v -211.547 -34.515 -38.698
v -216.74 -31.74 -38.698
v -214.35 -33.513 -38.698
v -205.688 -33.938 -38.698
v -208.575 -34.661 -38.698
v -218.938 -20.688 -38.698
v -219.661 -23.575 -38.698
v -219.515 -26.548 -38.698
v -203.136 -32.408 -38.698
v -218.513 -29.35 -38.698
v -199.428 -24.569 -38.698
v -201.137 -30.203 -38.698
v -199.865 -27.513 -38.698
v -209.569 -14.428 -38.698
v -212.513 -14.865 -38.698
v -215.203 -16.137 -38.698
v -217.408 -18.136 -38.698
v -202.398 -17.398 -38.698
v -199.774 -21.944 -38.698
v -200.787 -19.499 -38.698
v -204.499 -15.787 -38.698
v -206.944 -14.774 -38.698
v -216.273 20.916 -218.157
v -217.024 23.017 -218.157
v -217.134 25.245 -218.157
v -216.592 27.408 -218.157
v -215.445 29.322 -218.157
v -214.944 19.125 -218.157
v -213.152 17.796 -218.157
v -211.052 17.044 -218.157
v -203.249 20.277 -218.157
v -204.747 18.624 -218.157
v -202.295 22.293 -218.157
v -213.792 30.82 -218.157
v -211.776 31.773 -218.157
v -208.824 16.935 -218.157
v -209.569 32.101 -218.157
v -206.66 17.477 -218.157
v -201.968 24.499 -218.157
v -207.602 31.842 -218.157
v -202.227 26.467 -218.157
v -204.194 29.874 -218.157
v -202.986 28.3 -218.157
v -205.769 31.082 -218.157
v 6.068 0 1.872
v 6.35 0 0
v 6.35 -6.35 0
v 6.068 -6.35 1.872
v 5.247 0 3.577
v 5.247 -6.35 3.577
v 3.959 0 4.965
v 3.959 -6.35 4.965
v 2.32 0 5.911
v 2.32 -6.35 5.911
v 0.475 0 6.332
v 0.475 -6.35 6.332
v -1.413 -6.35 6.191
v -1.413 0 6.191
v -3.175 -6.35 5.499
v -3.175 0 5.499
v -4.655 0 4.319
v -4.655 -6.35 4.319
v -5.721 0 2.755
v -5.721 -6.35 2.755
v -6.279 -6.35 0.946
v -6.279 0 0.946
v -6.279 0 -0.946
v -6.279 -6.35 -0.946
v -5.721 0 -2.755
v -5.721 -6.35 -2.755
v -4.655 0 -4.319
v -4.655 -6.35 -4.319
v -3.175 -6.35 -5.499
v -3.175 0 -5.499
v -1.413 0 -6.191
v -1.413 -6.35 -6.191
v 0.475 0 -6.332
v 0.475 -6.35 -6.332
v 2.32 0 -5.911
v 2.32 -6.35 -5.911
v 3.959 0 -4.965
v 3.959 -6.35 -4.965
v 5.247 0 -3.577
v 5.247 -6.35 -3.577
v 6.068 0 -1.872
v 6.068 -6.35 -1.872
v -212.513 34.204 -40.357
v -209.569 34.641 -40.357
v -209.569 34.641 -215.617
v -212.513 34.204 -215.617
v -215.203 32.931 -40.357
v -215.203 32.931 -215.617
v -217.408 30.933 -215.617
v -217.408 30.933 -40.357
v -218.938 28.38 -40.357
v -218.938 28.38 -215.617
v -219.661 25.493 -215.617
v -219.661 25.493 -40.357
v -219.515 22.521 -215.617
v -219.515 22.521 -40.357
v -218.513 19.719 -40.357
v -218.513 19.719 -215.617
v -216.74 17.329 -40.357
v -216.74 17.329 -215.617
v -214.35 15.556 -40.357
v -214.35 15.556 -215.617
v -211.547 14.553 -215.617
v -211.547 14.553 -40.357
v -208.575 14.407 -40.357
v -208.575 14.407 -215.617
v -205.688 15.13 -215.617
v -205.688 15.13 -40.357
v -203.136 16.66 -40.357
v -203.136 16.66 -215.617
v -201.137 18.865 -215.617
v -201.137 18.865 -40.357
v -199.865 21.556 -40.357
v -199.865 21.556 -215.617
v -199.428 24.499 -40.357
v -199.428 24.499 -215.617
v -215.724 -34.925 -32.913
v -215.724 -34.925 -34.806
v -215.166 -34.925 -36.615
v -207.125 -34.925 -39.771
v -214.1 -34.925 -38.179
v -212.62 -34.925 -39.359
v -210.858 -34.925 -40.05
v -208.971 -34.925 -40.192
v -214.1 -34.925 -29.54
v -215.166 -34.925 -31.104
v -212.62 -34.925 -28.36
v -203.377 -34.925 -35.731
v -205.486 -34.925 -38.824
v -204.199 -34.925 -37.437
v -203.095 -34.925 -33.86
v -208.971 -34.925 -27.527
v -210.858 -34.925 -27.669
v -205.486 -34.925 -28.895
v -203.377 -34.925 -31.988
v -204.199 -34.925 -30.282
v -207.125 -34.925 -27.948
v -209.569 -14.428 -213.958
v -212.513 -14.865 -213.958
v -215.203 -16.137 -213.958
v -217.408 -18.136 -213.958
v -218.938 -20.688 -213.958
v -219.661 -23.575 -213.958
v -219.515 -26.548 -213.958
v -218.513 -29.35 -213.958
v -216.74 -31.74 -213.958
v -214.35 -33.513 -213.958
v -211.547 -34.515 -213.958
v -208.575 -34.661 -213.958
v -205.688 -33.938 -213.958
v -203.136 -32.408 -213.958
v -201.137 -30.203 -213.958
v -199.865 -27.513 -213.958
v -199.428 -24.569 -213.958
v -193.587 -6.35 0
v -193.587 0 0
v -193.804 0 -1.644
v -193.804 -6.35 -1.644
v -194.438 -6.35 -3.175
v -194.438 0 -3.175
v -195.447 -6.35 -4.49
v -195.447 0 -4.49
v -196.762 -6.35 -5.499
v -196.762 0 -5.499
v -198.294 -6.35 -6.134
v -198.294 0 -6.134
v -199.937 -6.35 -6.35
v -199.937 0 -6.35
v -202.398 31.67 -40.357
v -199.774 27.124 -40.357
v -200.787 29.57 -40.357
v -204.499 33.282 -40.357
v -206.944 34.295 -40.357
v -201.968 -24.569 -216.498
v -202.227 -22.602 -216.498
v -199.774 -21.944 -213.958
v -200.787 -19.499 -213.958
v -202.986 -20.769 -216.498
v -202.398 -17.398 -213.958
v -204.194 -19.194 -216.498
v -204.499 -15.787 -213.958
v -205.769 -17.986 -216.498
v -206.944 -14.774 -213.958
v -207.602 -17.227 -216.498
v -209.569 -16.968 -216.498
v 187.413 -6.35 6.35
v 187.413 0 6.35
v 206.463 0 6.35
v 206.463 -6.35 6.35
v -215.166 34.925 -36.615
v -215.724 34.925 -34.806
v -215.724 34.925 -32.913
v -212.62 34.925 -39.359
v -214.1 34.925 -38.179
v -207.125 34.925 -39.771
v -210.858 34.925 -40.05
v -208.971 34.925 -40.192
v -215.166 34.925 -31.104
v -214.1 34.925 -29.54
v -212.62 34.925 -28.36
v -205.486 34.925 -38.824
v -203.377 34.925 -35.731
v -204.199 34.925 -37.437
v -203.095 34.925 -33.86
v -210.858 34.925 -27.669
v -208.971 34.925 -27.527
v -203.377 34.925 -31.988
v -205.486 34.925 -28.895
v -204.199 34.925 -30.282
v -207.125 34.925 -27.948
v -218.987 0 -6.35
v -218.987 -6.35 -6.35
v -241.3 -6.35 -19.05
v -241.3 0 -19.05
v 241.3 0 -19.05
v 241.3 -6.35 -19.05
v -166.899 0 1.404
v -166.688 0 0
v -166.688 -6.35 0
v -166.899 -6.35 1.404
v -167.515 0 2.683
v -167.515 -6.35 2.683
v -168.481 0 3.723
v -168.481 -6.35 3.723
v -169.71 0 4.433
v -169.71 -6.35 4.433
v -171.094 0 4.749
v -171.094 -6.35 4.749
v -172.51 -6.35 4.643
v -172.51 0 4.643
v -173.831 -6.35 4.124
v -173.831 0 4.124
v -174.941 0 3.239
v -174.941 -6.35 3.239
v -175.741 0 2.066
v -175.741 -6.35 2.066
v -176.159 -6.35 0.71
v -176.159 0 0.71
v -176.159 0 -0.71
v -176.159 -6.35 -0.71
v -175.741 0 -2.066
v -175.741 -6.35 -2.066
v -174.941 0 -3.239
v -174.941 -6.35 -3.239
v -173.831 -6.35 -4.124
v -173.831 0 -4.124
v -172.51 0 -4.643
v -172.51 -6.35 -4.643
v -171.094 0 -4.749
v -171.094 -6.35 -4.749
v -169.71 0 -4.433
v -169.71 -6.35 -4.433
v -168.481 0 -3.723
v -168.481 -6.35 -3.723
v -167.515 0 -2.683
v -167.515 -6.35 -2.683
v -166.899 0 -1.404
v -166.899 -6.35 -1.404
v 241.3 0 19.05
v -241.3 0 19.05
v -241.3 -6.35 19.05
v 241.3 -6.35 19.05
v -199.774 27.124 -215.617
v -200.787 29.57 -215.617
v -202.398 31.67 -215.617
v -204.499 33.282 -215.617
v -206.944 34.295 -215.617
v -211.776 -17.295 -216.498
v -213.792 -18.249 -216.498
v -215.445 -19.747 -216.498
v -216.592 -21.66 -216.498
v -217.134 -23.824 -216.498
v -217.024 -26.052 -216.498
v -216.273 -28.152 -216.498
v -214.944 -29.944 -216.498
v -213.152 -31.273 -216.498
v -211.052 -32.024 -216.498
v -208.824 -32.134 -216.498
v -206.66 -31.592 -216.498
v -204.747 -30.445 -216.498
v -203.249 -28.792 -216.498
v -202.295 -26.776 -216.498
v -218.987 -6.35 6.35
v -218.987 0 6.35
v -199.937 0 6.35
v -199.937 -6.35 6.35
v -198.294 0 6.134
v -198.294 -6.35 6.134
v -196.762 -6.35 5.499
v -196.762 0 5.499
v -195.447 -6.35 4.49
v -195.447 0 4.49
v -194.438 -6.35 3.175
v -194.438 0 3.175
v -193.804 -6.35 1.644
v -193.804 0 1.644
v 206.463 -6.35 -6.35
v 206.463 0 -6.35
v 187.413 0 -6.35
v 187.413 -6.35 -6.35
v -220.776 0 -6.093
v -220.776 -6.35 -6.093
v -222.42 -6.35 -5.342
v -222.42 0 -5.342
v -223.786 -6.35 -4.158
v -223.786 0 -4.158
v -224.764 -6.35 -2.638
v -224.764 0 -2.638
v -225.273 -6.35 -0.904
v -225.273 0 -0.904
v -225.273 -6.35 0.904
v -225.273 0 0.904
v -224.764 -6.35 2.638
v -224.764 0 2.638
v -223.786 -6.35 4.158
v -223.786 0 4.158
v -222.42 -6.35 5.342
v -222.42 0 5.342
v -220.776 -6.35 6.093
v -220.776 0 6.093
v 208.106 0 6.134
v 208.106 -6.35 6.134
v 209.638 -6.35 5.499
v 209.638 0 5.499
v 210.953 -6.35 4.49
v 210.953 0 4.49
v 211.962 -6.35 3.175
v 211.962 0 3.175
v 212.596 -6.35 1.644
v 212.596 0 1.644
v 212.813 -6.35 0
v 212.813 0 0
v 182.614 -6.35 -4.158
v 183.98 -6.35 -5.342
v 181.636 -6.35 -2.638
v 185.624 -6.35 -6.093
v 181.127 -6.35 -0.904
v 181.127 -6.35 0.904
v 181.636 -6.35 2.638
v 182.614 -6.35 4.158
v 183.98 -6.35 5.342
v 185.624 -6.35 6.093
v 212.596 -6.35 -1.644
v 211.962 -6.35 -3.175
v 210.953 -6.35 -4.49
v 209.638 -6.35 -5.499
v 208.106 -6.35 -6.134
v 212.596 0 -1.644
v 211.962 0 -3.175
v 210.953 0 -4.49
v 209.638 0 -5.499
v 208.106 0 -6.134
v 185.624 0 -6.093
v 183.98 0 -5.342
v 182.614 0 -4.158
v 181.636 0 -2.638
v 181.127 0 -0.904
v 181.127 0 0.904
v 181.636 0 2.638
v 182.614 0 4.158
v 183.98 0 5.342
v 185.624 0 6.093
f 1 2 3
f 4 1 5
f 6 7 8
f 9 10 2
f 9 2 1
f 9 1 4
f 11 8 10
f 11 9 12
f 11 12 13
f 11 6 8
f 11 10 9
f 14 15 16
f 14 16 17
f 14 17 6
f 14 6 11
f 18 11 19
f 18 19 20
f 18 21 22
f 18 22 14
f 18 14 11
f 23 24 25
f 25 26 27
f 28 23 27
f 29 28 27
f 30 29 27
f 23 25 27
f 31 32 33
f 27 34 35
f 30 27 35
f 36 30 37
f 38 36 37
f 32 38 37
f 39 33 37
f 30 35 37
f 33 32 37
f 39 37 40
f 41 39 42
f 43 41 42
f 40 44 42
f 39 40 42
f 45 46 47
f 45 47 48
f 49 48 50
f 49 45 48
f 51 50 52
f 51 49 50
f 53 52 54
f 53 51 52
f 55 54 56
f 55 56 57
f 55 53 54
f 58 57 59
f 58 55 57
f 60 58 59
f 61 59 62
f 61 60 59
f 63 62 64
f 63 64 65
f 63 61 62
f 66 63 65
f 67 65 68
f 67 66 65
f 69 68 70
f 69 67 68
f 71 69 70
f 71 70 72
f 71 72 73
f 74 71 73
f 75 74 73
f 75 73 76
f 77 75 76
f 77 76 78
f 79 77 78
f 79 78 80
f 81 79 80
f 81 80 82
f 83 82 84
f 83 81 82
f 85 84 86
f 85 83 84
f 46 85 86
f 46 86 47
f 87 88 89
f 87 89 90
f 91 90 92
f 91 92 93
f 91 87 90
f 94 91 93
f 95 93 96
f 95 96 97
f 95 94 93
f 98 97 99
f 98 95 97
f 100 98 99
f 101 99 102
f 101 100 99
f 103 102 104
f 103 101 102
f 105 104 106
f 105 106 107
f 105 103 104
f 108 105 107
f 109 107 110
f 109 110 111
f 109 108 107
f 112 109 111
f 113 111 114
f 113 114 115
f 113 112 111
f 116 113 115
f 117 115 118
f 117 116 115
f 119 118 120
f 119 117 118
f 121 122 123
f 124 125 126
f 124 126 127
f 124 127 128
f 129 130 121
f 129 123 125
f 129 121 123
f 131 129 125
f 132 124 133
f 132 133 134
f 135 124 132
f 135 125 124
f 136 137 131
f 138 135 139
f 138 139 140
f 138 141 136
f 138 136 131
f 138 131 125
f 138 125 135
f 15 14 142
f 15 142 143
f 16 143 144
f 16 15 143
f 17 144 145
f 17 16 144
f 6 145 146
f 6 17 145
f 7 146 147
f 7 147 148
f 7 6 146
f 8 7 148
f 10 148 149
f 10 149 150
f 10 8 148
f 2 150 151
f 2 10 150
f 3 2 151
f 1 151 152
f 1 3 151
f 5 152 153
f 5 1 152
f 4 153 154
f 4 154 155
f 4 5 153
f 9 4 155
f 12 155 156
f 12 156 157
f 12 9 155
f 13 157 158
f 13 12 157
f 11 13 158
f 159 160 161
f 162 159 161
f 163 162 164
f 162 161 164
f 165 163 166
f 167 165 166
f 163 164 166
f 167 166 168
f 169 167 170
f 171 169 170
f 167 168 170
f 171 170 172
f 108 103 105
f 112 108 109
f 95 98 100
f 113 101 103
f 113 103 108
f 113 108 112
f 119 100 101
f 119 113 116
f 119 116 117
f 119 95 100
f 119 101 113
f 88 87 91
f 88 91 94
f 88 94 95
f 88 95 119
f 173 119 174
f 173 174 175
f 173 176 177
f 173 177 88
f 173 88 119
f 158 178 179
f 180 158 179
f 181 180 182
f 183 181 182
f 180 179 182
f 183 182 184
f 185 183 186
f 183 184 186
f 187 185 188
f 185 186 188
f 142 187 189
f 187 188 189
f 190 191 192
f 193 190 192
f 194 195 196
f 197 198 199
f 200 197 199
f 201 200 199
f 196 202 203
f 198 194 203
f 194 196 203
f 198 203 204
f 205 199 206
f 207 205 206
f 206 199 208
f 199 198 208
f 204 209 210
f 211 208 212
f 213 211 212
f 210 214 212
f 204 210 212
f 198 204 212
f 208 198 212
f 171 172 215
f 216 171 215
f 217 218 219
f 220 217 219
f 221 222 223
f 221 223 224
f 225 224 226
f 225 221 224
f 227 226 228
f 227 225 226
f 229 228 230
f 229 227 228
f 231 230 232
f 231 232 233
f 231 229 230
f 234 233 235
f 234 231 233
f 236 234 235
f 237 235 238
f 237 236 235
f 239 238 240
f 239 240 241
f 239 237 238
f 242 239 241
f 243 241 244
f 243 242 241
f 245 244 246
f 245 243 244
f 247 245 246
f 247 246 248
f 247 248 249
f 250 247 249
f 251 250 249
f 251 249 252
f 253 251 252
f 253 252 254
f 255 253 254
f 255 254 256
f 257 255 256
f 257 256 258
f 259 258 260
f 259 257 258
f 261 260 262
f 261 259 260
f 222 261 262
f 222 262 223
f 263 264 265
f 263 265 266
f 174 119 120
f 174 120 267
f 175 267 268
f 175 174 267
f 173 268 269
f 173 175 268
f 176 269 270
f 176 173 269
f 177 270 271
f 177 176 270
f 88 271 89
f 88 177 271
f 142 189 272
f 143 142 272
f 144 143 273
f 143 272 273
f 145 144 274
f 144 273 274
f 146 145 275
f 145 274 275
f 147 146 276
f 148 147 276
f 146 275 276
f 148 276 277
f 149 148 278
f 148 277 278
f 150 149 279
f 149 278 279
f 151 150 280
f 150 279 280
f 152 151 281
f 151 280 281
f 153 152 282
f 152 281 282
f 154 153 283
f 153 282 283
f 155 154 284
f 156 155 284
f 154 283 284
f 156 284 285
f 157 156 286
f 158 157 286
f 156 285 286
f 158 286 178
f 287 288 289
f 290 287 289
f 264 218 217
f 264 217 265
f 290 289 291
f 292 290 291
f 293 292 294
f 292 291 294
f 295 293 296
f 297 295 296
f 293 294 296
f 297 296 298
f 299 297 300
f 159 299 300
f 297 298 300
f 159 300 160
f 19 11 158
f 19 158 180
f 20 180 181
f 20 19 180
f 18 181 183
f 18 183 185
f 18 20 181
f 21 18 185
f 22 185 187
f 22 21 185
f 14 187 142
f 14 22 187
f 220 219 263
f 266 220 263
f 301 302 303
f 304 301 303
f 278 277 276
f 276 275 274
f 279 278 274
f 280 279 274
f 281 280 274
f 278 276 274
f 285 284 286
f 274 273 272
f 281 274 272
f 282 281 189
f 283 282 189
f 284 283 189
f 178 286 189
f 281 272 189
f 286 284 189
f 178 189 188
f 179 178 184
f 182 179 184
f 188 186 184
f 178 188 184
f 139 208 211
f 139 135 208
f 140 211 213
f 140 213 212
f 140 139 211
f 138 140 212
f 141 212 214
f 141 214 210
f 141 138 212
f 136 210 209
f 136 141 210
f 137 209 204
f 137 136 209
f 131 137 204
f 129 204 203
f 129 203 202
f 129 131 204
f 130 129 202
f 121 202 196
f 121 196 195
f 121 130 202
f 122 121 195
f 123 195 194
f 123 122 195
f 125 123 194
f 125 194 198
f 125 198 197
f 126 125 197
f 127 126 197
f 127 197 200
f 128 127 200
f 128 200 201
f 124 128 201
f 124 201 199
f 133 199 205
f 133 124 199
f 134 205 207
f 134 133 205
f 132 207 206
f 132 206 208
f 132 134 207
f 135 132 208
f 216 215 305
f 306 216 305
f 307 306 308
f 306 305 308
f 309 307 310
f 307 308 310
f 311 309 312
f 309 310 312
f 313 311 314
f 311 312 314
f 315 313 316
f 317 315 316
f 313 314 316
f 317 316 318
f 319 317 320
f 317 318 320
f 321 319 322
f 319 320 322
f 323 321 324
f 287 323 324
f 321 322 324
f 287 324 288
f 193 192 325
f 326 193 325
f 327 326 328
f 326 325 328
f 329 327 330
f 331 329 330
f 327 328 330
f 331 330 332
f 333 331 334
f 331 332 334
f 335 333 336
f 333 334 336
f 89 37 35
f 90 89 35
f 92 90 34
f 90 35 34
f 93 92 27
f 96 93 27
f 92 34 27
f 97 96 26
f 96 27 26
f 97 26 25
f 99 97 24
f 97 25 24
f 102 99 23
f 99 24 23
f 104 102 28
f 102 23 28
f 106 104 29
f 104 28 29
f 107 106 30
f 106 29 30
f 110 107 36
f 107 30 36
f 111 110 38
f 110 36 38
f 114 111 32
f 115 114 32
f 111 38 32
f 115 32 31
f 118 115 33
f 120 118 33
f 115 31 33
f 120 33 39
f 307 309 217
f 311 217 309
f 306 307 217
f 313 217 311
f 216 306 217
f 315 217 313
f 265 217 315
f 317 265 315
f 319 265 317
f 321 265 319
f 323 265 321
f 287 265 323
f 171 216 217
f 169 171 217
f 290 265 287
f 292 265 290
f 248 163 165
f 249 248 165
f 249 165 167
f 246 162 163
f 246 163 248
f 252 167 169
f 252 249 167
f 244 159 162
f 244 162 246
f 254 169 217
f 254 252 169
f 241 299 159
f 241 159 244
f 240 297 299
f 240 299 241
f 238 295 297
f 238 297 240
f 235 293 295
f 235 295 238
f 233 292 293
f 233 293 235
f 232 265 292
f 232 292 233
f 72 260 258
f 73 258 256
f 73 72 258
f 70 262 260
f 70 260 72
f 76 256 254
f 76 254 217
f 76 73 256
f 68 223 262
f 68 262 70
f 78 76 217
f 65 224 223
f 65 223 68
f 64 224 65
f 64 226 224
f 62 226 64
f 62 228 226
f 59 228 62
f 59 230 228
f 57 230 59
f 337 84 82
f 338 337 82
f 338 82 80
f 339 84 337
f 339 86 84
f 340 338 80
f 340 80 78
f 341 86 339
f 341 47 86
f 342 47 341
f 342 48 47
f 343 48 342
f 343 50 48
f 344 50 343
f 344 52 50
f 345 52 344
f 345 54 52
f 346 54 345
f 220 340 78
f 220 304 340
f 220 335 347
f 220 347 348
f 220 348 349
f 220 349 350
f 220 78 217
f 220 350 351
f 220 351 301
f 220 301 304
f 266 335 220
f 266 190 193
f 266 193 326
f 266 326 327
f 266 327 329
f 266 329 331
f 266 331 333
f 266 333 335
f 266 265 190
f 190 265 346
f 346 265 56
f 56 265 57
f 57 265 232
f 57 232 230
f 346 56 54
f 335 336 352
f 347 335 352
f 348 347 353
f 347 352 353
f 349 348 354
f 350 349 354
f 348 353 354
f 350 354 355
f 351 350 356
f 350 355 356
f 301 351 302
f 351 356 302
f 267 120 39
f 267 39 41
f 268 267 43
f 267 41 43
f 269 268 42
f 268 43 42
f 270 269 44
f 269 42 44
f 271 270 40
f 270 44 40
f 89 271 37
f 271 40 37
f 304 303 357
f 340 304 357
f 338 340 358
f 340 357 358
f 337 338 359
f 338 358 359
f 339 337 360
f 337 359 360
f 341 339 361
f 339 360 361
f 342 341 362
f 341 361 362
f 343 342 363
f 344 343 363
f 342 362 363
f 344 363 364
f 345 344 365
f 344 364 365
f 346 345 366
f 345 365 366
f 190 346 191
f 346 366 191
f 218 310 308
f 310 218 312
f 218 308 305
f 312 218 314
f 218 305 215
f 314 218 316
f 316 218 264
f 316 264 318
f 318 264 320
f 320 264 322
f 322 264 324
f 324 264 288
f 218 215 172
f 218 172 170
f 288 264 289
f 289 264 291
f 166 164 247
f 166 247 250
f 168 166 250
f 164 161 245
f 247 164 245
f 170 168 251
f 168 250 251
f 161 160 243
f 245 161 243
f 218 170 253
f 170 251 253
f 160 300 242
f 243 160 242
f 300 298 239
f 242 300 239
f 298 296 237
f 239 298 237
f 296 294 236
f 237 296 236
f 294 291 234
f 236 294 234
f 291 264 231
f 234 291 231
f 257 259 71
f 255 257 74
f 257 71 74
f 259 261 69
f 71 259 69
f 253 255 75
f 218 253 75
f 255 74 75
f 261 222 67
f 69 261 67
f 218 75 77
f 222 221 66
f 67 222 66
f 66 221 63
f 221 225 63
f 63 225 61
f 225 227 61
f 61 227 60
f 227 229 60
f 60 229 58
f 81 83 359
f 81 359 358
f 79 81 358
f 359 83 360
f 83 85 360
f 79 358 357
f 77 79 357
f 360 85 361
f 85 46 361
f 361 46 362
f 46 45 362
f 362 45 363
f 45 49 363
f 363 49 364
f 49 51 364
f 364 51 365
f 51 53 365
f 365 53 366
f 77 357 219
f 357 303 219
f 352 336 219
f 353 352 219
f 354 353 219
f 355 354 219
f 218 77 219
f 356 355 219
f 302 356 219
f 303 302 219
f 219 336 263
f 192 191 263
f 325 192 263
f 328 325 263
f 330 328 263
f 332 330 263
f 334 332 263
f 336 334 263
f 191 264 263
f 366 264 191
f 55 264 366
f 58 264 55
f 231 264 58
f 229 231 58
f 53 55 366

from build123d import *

# Parameters (mm, degrees)
F0_W     = 482.6
F0_H     = 38.1
F0_R     = 4.7625
F0_R_2   = 6.35
F1_DEPTH = 6.35
F2_R     = 6.35
F3_DEPTH = 34.925
F5_START = -25.4
F5_DEPTH = 177.8
F8_SIZE  = 2.54
F9_SIZE  = 2.54


with BuildPart() as f1:
    # F0 (on Front) → F1 (new body)
    with BuildSketch(Plane.XZ):
        Rectangle(F0_W, F0_H)
        with BuildLine():
            ThreePointArc((-218.9873446465, -6.35), (-225.3373446465, 0), (-218.9873446465, 6.35))
            Line((-218.9873446465, 6.35), (-199.9373446465, 6.35))
            ThreePointArc((-199.9373446465, 6.35), (-195.4472165859, 4.4901280605), (-193.5873446465, 0))
            ThreePointArc((-193.5873446465, 0), (-195.4472165859, -4.4901280605), (-199.9373446465, -6.35))
            Line((-199.9373446465, -6.35), (-218.9873446465, -6.35))
        make_face(mode=Mode.SUBTRACT)
        with Locations((-171.45, 0)):
            Circle(F0_R, mode=Mode.SUBTRACT)
        Circle(F0_R_2, mode=Mode.SUBTRACT)
        with BuildLine():
            Line((187.4126553535, 6.35), (206.4626553535, 6.35))
            ThreePointArc((206.4626553535, 6.35), (210.9527834141, 4.4901280605), (212.8126553535, 0))
            ThreePointArc((212.8126553535, 0), (210.9527834141, -4.4901280605), (206.4626553535, -6.35))
            Line((206.4626553535, -6.35), (187.4126553535, -6.35))
            ThreePointArc((187.4126553535, -6.35), (181.0626553535, 0), (187.4126553535, 6.35))
        make_face(mode=Mode.SUBTRACT)
    extrude(amount=F1_DEPTH)


with BuildPart() as f3:
    # F2 (on Front) → F3 (new body, symmetric)
    with BuildSketch(Plane.XZ):
        with Locations((-209.4452381134, -33.8595211506)):
            Circle(F2_R)
    extrude(amount=F3_DEPTH, both=True)


with BuildPart() as f5:
    # F4 (on Top) → F5 (new body)
    with BuildSketch(Plane.XY.offset(F5_START)):
        with BuildLine():
            ThreePointArc((-209.5690518618, -35.2836660483), (-216.7398640233, -52.5955380219), (-199.4279920497, -45.4247258604))
            ThreePointArc((-199.4279920497, -45.4247258604), (-202.3982397002, -38.2539136988), (-209.5690518618, -35.2836660483))
        make_face()
    extrude(amount=-F5_DEPTH)


with BuildPart() as f6_1:
    # F6: copy of F5
    add(f5.part.moved(Location((0, 69.92422, -14.95706))))

    # F9
    f9_edges = [f6_1.edges().sort_by_distance(p)[0] for p in [
        (-219.710112, 24.499494, -218.15706),
    ]]
    chamfer(f9_edges, length=F9_SIZE)


with BuildPart() as f5_1:
    # F7: moved
    add(f5.part.moved(Location((0, 20.85559, -13.29831))))

    # F8
    f8_edges = [f5_1.edges().sort_by_distance(p)[0] for p in [
        (-219.710112, -24.569136, -216.49831),
    ]]
    chamfer(f8_edges, length=F8_SIZE)


solid = Compound([f1.part, f3.part, f6_1.part, f5_1.part])
